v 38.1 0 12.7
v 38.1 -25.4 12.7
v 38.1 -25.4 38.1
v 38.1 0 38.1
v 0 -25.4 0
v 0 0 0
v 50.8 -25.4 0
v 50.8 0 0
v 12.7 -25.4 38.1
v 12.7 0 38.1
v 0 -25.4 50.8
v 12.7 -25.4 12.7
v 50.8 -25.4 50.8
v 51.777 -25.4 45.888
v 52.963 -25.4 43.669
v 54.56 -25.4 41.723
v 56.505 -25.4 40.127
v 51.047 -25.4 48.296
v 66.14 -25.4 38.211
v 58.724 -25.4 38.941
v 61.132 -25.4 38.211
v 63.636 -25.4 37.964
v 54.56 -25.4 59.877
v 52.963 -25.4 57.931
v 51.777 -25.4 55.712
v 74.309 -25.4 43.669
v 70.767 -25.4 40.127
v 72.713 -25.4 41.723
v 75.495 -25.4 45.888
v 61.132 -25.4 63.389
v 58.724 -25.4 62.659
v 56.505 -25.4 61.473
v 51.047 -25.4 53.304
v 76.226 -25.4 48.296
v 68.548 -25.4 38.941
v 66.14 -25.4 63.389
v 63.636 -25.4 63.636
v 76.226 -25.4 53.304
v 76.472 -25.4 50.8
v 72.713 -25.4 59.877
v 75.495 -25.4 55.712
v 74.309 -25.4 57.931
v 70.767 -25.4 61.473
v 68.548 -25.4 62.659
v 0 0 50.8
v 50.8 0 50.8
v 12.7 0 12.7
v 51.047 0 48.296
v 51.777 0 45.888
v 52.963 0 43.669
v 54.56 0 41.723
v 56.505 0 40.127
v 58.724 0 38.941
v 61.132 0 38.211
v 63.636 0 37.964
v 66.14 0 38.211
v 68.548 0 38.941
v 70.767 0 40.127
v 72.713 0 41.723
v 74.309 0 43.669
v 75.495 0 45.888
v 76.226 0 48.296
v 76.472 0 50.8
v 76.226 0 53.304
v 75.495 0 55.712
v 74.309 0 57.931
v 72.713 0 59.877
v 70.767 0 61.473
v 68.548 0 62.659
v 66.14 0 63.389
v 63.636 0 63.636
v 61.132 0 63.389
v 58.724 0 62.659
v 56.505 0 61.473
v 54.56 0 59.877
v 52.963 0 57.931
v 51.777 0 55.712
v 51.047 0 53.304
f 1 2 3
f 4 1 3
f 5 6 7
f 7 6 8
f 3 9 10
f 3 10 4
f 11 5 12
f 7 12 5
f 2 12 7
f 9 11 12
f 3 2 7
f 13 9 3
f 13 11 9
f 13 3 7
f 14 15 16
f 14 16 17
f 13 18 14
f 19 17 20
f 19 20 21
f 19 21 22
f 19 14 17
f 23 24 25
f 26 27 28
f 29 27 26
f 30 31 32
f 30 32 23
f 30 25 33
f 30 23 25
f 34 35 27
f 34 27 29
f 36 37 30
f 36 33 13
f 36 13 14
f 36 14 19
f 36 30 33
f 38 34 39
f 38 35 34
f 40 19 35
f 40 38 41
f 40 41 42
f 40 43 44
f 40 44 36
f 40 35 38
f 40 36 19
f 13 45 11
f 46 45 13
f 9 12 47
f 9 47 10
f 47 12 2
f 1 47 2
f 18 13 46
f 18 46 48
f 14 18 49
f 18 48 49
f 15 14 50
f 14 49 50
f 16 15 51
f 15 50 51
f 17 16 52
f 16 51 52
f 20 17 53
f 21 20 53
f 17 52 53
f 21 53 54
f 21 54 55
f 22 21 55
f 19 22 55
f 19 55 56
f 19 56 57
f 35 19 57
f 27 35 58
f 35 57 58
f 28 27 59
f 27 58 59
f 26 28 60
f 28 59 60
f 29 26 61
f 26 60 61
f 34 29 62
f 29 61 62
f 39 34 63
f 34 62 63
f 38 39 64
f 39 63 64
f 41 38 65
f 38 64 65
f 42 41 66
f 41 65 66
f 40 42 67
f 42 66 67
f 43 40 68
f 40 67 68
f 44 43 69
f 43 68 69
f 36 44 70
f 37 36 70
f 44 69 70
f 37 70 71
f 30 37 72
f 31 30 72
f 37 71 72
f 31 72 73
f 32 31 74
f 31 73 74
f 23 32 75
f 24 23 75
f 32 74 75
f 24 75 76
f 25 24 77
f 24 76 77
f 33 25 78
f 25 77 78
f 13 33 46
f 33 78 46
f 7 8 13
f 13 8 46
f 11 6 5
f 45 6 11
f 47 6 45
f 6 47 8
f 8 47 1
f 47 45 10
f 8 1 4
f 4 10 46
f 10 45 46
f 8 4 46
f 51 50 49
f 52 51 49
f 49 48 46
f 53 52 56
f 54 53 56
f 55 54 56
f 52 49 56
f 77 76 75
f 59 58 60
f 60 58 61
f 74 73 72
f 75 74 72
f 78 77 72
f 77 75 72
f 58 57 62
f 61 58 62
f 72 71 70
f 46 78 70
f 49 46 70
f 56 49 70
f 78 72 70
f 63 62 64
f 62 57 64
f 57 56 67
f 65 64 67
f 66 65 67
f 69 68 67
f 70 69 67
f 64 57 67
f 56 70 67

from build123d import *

# Parameters (mm, degrees)
F0_W     = 50.8
F0_H     = 50.8
F0_W_2   = 25.4
F0_H_2   = 25.4
F1_DEPTH = 25.4


with BuildPart() as f1:
    # F0 (on Front) → F1 (new body)
    with BuildSketch(Plane.XZ):
        with BuildLine():
            ThreePointArc((76.472228, 50.8), (63.636114, 63.636114), (50.8, 50.8))
            ThreePointArc((50.8, 50.8), (63.636114, 37.963886), (76.472228, 50.8))
        make_face()
        with Locations((25.4, 25.4)):
            Rectangle(F0_W, F0_H)
        with Locations((25.4, 25.4)):
            Rectangle(F0_W_2, F0_H_2, mode=Mode.SUBTRACT)
    extrude(amount=F1_DEPTH)


solid = f1.part
